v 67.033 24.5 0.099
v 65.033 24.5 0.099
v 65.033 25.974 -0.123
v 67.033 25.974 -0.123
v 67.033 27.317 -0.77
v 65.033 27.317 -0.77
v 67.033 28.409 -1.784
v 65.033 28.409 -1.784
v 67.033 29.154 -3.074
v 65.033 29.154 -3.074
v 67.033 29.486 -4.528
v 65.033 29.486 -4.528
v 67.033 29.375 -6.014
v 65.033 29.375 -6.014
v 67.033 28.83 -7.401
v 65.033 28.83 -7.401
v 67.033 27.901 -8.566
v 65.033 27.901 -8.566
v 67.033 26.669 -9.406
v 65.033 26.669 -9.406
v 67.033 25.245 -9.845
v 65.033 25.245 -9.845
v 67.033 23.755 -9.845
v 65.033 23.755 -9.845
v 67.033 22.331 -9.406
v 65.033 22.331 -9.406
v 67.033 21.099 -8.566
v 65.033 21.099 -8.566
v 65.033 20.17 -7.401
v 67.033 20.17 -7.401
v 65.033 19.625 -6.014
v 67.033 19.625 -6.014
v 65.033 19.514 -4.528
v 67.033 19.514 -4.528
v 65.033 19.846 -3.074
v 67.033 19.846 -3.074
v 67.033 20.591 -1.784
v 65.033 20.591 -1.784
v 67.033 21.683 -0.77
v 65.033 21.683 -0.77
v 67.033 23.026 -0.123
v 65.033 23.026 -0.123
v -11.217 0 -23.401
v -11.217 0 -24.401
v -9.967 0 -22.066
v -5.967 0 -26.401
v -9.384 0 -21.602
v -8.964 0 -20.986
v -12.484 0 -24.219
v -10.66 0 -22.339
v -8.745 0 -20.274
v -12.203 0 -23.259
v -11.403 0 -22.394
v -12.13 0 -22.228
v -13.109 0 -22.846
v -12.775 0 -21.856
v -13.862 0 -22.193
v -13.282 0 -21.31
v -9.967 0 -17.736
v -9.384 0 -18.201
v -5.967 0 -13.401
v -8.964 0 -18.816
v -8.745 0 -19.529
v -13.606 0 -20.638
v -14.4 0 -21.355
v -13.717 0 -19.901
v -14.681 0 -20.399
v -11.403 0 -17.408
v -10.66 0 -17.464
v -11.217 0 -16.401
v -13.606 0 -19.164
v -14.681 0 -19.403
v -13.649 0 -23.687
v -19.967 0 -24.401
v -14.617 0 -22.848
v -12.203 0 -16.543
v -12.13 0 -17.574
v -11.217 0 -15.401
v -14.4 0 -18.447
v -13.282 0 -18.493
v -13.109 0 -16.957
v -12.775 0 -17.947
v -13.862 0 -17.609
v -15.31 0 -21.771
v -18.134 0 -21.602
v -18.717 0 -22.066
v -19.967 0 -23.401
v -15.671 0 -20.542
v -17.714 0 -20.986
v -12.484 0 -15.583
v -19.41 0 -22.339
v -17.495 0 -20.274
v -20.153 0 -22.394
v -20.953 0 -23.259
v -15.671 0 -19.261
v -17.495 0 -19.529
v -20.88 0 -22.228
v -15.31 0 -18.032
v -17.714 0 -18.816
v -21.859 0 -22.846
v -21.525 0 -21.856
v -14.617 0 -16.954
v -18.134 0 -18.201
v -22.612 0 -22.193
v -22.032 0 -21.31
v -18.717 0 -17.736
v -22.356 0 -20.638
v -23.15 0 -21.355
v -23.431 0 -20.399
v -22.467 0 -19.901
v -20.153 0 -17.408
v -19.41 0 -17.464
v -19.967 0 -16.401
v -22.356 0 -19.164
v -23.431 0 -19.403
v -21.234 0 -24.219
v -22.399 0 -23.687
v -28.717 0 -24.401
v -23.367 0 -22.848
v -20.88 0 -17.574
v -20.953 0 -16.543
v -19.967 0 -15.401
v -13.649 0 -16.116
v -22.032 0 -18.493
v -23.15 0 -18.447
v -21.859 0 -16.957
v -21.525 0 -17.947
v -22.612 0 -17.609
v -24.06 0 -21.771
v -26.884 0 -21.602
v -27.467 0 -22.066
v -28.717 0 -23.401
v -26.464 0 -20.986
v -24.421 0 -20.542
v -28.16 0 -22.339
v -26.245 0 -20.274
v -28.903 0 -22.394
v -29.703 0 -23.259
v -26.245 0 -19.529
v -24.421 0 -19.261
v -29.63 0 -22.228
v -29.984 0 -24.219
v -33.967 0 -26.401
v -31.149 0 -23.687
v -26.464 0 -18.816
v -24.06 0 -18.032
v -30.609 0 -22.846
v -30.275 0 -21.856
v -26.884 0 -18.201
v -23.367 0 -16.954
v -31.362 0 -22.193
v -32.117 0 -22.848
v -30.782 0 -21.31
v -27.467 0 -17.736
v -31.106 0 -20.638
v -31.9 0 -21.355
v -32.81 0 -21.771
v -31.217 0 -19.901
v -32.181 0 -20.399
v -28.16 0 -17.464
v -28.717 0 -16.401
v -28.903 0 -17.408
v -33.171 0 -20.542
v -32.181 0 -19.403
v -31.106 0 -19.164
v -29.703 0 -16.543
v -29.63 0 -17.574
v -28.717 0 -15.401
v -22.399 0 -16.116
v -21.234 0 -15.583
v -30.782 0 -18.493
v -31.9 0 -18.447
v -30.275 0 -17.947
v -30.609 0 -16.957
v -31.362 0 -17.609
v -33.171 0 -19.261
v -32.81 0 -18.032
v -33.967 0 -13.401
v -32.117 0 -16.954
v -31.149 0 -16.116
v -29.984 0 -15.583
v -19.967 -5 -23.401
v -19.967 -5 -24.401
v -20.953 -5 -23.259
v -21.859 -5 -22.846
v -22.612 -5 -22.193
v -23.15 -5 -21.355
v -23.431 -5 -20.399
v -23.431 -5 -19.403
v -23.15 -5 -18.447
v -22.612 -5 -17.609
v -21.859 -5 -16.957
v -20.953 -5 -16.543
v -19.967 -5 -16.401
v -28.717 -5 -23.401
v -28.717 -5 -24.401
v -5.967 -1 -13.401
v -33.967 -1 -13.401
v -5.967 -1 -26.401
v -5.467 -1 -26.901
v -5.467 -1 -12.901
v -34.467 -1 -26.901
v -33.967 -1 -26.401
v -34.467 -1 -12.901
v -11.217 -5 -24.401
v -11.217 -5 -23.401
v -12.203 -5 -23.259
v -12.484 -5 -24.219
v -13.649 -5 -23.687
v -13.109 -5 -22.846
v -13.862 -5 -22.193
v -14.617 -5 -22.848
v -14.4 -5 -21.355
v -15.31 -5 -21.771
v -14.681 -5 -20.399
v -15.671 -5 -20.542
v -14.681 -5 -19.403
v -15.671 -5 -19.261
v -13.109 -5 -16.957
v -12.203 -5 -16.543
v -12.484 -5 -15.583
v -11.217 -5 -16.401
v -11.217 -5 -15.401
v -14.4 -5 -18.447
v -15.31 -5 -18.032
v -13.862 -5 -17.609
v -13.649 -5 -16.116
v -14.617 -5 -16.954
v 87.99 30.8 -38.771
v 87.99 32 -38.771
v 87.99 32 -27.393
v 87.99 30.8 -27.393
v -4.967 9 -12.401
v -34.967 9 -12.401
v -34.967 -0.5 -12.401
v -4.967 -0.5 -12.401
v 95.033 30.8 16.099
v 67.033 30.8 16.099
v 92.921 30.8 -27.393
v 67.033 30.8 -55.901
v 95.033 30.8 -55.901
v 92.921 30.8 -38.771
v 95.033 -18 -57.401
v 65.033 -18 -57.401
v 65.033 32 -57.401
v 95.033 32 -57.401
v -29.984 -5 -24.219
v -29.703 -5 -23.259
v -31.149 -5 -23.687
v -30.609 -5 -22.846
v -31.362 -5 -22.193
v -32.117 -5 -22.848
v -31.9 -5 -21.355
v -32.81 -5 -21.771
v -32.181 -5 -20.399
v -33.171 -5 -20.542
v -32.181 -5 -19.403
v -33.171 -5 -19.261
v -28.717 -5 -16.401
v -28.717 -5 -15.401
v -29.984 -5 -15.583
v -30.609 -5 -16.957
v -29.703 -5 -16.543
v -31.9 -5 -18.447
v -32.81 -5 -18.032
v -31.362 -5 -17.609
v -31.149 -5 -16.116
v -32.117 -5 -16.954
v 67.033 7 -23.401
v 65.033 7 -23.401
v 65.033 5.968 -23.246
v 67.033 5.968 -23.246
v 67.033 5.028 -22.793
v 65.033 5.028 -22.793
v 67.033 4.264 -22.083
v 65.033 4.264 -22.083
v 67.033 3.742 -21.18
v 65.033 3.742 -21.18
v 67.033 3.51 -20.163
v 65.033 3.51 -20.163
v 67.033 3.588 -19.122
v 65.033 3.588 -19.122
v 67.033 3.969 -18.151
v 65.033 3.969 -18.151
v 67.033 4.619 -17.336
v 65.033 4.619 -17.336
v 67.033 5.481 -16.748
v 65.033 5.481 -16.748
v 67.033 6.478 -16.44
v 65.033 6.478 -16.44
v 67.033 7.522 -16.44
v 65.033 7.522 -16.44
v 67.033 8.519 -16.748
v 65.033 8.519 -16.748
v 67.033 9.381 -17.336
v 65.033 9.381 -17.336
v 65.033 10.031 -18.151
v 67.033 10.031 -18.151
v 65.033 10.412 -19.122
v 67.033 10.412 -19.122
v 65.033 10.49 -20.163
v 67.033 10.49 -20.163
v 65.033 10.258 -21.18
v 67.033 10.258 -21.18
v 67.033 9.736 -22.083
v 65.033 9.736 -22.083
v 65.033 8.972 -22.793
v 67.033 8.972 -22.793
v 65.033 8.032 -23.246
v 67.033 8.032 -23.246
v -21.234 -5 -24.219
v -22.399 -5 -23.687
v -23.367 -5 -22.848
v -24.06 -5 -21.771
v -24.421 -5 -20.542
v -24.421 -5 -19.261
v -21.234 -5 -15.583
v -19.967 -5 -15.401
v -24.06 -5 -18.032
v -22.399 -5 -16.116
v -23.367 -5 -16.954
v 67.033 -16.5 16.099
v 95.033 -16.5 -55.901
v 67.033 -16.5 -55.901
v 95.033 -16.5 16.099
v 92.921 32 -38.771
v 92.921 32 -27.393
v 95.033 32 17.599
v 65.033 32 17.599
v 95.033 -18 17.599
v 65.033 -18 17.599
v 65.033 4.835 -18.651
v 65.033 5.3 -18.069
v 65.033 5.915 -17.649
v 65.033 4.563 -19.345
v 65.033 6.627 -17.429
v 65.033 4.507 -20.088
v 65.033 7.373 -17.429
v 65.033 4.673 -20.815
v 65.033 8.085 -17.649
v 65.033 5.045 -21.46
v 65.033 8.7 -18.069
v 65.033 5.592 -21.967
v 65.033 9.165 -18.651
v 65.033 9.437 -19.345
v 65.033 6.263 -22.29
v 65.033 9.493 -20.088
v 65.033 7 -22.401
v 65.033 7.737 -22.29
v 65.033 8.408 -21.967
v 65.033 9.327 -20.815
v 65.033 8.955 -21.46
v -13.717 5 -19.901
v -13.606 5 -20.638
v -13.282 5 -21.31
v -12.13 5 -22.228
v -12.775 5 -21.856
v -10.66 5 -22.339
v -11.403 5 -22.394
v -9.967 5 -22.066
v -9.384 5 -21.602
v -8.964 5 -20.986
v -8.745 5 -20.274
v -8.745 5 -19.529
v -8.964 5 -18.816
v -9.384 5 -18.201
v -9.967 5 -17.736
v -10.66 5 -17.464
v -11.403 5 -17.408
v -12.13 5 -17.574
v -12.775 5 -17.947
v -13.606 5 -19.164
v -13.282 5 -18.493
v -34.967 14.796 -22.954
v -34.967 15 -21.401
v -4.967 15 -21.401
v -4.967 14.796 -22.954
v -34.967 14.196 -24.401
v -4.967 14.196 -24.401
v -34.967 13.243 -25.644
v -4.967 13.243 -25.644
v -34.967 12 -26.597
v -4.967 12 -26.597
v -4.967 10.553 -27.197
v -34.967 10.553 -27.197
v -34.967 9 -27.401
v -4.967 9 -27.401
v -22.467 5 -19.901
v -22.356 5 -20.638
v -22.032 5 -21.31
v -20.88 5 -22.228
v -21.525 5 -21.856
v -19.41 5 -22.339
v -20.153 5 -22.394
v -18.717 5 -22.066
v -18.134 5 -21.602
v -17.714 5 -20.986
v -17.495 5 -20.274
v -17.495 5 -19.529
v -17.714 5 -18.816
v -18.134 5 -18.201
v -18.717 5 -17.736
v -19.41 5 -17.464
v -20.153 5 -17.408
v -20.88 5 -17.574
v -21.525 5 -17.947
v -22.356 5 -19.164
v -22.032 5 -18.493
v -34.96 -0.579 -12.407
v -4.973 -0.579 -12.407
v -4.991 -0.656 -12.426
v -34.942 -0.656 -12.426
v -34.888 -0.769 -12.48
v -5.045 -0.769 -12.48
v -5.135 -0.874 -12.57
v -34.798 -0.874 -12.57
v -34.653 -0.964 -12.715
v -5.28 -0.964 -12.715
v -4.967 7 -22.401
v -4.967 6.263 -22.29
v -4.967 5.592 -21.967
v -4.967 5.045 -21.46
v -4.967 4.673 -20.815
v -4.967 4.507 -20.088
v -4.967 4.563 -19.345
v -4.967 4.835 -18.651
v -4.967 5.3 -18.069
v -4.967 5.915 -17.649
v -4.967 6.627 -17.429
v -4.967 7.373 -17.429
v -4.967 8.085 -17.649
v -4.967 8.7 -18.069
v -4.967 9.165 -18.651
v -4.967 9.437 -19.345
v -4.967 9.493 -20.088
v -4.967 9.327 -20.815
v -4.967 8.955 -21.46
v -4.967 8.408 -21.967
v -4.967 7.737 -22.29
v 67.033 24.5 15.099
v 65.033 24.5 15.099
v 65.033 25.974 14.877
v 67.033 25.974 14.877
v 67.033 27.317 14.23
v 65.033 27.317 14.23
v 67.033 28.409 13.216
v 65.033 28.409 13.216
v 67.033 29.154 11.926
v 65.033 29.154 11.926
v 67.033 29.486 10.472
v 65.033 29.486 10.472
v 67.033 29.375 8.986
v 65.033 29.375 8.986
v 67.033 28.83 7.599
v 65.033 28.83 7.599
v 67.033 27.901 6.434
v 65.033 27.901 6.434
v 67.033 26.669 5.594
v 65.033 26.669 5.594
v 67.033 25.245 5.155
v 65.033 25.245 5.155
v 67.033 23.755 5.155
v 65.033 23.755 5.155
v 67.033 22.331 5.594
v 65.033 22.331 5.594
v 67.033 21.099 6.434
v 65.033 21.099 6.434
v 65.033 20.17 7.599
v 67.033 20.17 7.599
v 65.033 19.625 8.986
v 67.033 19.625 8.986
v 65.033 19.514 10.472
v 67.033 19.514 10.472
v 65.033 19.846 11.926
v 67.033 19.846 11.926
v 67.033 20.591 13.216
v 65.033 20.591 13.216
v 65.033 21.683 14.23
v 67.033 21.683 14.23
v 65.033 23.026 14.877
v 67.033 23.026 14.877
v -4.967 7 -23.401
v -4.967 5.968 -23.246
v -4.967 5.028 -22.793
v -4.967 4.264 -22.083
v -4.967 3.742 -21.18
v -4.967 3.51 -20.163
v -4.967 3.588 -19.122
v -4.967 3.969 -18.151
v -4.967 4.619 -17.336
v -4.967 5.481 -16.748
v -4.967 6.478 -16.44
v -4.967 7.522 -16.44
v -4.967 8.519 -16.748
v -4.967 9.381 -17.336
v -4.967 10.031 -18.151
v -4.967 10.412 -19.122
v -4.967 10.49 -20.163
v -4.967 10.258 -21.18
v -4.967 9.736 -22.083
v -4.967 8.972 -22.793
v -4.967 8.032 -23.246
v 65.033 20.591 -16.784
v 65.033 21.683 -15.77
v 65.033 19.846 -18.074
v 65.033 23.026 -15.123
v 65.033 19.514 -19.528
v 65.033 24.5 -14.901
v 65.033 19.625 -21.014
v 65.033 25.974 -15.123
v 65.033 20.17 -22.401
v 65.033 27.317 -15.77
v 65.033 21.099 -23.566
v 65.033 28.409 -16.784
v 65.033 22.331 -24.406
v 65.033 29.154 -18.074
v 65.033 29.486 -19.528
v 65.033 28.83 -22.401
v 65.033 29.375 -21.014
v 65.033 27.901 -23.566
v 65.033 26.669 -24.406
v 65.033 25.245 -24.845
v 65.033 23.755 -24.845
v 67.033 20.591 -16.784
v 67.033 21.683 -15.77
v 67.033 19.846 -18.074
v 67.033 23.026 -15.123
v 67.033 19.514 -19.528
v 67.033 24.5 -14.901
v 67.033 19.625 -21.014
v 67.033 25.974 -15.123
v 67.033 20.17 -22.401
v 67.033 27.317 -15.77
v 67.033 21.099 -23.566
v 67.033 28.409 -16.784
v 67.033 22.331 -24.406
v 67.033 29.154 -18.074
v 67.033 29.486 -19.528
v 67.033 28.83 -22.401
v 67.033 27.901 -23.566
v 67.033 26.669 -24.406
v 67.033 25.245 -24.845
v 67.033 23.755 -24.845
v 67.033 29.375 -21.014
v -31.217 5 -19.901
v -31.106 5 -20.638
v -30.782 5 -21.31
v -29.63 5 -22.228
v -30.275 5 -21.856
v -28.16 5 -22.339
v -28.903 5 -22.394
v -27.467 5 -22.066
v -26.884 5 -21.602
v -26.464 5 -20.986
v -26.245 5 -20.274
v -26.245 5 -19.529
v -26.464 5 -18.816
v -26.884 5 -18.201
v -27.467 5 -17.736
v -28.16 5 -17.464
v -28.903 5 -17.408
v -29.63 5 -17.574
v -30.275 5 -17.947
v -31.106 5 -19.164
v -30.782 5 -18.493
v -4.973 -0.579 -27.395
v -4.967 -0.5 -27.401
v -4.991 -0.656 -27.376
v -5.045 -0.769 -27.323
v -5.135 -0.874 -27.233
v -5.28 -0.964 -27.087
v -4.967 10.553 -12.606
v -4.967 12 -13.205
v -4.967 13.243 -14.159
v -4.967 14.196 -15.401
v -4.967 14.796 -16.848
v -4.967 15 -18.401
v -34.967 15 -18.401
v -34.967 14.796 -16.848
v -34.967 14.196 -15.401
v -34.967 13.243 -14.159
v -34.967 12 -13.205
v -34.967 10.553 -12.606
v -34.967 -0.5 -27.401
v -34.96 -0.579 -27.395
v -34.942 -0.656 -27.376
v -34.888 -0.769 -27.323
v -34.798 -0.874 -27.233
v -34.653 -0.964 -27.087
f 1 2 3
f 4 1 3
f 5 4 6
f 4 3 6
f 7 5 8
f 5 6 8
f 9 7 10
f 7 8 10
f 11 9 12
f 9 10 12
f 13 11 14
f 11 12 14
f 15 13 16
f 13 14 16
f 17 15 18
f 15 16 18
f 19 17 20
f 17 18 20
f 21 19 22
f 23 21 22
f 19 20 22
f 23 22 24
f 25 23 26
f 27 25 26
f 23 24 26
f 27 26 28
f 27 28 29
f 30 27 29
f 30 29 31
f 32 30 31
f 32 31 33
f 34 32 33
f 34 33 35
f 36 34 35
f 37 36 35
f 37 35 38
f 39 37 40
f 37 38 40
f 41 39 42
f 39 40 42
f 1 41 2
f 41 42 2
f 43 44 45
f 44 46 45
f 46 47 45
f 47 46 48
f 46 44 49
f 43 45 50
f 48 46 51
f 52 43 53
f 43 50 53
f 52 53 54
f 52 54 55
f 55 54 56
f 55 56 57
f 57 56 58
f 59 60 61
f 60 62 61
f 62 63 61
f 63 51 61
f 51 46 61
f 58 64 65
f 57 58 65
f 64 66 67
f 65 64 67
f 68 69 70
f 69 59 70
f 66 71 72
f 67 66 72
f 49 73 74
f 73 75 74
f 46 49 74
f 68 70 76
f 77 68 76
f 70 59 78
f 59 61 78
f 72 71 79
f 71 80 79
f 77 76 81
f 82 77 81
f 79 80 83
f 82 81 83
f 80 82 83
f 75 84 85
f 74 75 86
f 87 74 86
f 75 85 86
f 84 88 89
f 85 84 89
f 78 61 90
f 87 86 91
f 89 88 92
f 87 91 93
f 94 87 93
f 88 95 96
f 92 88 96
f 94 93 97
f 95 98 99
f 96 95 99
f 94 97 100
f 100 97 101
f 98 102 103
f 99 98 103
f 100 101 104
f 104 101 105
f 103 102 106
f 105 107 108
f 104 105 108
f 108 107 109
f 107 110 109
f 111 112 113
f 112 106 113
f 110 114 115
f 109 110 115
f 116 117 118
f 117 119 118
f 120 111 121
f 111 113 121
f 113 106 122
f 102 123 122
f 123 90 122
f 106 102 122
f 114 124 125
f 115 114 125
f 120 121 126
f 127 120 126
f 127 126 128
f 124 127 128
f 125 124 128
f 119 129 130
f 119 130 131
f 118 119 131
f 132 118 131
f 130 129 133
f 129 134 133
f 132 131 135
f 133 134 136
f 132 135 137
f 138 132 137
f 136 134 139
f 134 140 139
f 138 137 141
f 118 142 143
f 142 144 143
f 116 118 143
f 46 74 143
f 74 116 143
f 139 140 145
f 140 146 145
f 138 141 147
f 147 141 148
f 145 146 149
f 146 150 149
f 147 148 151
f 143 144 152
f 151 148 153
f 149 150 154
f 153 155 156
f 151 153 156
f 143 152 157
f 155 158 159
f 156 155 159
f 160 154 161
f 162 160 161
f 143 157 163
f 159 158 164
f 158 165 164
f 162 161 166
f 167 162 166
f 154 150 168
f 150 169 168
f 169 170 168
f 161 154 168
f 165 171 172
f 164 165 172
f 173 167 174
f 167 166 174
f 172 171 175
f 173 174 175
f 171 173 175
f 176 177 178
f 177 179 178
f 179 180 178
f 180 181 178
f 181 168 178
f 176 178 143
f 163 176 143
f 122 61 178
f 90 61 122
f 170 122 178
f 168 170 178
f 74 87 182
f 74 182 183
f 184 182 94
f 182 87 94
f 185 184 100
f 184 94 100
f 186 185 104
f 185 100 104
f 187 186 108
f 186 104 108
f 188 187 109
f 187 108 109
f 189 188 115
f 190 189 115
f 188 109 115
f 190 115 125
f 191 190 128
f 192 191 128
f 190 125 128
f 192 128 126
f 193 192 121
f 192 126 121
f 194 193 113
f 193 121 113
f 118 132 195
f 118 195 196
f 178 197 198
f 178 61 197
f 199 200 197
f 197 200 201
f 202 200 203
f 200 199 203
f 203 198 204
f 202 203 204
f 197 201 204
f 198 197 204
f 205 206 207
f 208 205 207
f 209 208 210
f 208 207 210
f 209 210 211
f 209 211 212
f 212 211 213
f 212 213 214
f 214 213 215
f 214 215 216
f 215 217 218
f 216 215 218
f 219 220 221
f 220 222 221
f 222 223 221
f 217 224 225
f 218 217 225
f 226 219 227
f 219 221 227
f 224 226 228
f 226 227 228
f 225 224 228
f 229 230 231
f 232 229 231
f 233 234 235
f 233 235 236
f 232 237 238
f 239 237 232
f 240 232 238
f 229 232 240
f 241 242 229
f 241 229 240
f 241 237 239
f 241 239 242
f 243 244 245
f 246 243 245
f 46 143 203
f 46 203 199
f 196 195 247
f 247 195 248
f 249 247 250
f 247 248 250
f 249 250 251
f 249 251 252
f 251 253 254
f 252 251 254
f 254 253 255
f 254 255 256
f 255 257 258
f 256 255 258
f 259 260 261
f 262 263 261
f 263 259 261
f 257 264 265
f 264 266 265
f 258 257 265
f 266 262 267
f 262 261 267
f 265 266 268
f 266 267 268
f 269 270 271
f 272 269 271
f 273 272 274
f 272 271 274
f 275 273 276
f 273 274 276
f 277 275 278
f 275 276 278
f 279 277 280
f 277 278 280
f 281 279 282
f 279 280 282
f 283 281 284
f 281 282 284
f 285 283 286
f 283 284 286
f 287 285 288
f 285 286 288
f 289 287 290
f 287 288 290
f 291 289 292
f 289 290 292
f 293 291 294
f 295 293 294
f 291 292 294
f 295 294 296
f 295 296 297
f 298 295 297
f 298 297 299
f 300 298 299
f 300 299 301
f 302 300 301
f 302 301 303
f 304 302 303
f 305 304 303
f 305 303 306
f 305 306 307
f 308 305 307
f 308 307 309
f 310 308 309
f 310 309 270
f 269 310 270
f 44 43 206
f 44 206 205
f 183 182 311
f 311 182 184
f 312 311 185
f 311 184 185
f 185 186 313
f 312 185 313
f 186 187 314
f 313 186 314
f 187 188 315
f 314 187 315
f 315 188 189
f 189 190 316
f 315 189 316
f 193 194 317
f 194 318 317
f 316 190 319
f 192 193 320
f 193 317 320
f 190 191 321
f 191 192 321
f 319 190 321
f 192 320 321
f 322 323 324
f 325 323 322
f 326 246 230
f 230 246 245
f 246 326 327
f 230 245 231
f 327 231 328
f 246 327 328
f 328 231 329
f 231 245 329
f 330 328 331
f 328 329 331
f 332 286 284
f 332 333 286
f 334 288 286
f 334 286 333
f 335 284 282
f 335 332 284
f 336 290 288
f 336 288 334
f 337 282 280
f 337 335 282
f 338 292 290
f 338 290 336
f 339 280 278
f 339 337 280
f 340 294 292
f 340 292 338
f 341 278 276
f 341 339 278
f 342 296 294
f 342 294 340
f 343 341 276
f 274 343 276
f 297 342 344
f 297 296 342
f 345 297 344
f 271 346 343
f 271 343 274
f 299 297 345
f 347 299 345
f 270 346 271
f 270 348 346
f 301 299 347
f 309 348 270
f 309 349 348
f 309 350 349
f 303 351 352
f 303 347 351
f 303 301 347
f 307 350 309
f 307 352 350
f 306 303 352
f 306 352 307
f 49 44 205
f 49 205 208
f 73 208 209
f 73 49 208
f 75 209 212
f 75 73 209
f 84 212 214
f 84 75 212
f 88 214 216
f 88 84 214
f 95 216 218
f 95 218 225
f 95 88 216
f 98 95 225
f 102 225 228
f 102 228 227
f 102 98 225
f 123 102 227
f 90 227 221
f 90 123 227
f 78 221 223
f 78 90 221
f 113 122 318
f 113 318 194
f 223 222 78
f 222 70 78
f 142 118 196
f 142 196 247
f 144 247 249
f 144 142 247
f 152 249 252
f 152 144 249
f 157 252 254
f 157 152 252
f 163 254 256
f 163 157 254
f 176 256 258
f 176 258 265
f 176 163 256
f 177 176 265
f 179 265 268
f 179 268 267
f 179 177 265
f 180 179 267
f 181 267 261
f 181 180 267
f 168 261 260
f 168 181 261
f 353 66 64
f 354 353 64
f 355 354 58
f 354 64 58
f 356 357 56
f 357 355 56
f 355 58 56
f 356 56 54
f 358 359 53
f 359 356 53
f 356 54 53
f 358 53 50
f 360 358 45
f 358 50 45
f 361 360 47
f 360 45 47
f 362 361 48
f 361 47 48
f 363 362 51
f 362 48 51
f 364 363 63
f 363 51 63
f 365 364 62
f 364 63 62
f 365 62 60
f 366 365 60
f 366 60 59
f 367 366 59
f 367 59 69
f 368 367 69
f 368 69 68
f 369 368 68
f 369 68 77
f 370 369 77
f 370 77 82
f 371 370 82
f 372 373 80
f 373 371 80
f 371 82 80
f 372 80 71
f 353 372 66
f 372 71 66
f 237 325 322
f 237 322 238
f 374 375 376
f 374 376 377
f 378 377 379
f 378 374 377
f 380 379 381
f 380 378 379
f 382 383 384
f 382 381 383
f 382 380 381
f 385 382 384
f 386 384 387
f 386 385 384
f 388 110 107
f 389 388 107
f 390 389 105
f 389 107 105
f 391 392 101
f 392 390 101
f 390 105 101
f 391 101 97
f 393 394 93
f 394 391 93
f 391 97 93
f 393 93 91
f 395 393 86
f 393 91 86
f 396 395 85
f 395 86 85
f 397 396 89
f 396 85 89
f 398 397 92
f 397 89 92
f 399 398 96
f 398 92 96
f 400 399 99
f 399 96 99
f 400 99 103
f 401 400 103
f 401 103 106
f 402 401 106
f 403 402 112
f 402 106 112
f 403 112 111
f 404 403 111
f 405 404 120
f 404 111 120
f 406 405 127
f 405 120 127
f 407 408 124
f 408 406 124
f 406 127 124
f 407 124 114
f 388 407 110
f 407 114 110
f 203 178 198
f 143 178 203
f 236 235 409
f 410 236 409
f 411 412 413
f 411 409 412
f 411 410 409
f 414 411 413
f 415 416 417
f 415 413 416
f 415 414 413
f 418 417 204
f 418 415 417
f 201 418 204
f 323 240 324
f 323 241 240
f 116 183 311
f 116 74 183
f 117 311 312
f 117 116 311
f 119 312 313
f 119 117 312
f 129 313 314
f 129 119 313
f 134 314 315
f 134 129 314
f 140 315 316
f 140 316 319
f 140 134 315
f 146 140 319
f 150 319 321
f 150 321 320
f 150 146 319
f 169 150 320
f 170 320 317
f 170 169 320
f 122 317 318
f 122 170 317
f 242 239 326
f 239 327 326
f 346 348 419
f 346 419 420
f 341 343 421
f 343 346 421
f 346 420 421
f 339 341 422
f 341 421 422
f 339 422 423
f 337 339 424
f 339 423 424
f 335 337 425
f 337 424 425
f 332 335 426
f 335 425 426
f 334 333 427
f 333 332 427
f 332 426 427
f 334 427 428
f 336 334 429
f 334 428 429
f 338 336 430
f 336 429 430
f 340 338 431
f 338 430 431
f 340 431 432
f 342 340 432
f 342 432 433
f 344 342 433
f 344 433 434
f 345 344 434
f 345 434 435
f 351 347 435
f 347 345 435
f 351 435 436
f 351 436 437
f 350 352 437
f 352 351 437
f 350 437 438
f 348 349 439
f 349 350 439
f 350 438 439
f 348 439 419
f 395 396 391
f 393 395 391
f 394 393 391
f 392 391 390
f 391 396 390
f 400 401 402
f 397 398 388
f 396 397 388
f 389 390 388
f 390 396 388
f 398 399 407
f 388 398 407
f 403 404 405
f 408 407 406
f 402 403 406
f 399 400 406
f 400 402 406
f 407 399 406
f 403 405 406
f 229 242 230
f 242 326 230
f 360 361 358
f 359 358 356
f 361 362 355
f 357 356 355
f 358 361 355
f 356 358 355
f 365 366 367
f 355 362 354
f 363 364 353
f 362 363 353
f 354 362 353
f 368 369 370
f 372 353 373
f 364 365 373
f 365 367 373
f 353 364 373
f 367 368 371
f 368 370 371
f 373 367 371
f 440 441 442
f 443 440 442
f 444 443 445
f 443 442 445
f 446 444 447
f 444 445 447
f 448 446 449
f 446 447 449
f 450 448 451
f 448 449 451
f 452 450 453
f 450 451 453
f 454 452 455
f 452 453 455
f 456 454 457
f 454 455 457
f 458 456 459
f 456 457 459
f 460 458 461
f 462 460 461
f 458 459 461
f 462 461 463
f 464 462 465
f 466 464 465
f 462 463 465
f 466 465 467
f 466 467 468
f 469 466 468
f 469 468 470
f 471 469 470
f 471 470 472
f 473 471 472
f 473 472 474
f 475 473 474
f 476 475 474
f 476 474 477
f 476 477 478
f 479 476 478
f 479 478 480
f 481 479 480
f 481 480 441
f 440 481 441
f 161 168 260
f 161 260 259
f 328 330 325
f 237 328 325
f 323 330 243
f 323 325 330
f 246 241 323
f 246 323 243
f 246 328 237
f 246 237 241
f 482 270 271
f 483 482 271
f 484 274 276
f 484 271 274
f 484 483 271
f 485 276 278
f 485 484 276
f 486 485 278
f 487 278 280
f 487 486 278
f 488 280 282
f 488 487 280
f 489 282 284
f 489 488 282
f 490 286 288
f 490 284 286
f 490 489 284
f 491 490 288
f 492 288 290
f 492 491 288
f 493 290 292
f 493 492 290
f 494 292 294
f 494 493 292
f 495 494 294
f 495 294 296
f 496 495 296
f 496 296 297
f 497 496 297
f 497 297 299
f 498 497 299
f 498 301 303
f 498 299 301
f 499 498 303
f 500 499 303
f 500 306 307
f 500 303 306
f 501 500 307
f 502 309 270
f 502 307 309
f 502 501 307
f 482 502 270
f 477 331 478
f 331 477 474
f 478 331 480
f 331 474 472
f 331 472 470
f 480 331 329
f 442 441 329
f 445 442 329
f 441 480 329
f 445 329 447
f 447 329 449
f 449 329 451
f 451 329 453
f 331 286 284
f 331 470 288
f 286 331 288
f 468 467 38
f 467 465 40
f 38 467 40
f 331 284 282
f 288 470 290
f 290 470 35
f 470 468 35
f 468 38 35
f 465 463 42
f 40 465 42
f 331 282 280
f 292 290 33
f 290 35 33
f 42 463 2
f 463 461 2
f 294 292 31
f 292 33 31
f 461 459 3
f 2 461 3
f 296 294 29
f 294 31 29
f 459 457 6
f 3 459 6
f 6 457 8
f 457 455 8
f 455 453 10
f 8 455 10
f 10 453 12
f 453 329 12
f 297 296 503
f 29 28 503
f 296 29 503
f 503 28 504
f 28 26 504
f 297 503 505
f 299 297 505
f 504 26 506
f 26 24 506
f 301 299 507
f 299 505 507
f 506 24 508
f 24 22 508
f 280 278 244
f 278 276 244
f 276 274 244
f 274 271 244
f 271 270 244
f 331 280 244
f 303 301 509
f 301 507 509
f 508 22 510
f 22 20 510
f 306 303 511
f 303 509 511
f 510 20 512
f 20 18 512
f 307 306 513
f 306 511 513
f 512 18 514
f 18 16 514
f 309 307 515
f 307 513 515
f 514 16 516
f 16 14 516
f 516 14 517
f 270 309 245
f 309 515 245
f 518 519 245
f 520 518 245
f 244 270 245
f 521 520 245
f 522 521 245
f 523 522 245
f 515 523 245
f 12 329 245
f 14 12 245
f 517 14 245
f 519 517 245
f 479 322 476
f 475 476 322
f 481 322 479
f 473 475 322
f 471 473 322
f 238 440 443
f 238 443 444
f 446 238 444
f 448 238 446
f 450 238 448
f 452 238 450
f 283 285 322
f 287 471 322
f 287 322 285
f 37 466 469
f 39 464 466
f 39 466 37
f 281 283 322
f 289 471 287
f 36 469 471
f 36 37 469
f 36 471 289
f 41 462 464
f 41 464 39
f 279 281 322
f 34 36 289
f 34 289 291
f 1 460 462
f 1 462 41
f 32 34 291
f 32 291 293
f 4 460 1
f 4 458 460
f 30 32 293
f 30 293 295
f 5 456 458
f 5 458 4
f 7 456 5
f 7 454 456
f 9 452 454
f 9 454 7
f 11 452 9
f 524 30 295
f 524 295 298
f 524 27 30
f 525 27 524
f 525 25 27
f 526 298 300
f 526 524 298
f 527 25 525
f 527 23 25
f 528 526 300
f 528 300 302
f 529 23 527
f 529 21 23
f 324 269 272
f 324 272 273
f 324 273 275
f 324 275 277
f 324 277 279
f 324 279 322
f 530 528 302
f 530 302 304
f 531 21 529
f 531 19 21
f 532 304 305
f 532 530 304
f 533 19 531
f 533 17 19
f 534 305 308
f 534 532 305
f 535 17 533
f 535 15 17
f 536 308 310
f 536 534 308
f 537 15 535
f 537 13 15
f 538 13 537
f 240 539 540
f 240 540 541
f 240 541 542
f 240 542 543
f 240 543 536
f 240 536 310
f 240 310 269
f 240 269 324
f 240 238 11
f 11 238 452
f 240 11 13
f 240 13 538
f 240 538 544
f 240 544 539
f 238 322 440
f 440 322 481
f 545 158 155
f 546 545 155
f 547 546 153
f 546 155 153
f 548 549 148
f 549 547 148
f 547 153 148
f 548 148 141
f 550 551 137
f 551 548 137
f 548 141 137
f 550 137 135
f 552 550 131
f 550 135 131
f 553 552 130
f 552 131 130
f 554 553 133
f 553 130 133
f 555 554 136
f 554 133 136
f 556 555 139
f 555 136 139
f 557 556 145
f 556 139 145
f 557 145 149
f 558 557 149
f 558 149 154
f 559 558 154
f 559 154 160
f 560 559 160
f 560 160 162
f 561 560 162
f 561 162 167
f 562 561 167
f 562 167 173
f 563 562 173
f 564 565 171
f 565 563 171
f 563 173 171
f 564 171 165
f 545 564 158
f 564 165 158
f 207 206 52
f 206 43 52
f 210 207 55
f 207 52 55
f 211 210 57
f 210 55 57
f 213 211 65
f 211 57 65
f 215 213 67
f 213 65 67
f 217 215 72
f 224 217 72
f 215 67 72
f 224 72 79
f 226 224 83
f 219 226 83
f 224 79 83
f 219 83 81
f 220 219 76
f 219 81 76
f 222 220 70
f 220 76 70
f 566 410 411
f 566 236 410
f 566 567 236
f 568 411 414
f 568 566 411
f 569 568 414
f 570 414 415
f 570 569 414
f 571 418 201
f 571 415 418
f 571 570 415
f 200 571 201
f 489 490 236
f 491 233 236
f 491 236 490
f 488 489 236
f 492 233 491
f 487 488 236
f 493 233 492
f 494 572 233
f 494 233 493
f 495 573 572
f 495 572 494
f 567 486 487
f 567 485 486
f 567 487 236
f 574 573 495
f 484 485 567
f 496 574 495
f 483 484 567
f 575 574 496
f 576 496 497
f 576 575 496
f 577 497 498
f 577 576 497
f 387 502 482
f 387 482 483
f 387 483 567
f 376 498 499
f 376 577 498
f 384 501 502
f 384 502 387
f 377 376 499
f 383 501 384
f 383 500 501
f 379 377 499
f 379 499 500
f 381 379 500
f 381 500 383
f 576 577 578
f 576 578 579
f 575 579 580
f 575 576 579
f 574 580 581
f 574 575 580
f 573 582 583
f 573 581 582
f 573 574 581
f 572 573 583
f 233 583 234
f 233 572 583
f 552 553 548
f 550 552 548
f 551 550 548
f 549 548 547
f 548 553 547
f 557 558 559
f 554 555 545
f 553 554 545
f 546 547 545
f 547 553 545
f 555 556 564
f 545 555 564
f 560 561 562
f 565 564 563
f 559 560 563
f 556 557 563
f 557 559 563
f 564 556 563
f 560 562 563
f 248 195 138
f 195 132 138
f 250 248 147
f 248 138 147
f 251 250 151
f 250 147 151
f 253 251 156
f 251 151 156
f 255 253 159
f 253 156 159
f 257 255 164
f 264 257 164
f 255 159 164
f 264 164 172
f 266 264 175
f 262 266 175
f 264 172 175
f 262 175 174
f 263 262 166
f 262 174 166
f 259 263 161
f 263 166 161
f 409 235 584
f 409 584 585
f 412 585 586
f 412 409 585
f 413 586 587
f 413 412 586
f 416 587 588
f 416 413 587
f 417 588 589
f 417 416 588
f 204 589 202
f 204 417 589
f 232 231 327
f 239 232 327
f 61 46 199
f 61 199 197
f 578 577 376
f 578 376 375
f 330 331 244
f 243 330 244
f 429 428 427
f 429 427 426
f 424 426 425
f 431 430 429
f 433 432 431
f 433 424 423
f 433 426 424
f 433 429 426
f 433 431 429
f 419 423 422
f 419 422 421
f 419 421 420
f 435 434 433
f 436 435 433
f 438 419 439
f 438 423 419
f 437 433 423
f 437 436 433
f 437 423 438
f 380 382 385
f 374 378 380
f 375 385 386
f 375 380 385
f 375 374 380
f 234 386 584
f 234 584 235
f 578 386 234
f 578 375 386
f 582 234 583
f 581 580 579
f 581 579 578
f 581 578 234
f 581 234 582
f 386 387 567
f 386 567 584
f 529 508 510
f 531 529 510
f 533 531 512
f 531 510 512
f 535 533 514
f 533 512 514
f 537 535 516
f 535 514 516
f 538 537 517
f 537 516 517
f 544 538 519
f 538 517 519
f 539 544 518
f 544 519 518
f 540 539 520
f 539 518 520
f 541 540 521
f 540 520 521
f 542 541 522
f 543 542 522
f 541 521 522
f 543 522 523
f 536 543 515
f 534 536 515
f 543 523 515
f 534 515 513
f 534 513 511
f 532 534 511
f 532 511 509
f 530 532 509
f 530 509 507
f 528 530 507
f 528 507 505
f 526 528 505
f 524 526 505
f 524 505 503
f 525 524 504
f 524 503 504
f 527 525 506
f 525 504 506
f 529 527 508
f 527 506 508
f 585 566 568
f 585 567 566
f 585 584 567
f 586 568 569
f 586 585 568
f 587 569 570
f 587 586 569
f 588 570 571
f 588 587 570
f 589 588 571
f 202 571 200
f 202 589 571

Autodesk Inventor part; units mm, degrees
ref_plane "YZ Plane" through (0, 0, 0) normal (1, 0, 0) x (0, 1, 0)
ref_plane "XZ Plane" through (0, 0, 0) normal (0, 1, 0) x (-1, 0, 0)
ref_plane "XY Plane" through (0, 0, 0) normal (0, 0, 1) x (1, 0, 0)
sketch "Skizze1" plane through (0, 0, 0) normal (0, 1, 0) x (-1, 0, 0)
  line L0 (34.9666, -12.4012) -> (4.9666, -12.4012)
  line L1 (4.9666, -12.4012) -> (4.9666, -27.4012)
  line L2 (4.9666, -27.4012) -> (34.9666, -27.4012)
  line L3 (34.9666, -27.4012) -> (34.9666, -12.4012)
  circle A0 centre (28.7166, -19.9012) radius 2.5
  circle A1 centre (19.9666, -19.9012) radius 2.5
  circle A2 centre (11.2166, -19.9012) radius 2.5
  line L4 (34.9666, -19.9012) -> (4.9666, -19.9012) construction
  arc A3 (19.9666, -23.4012) -> (19.9666, -16.4012) centre (19.9666, -19.9012) ccw
  arc A4 (28.7166, -23.4012) -> (28.7166, -16.4012) centre (28.7166, -19.9012) ccw
  arc A5 (11.2166, -23.4012) -> (11.2166, -16.4012) centre (11.2166, -19.9012) ccw
  arc A6 (11.2166, -24.4012) -> (11.2166, -15.4012) centre (11.2166, -19.9012) ccw
  arc A7 (19.9666, -24.4012) -> (19.9666, -15.4012) centre (19.9666, -19.9012) ccw
  arc A8 (28.7166, -24.4012) -> (28.7166, -15.4012) centre (28.7166, -19.9012) ccw
  line L5 (11.2166, -16.4012) -> (11.2166, -15.4012)
  line L6 (11.2166, -23.4012) -> (11.2166, -24.4012)
  line L7 (19.9666, -15.4012) -> (19.9666, -16.4012)
  line L8 (19.9666, -23.4012) -> (19.9666, -24.4012)
  line L9 (28.7166, -15.4012) -> (28.7166, -16.4012)
  line L10 (28.7166, -23.4012) -> (28.7166, -24.4012)
  line L11 (33.9666, -26.4012) -> (5.9666, -26.4012)
  line L12 (5.9666, -26.4012) -> (5.9666, -13.4012)
  line L13 (5.9666, -13.4012) -> (33.9666, -13.4012)
  line L14 (33.9666, -13.4012) -> (33.9666, -26.4012)
  point P0 (0, 0)
  dimension "d0" = 30
  dimension "d1" = 5
  dimension "d2" = 5
  dimension "d3" = 5
  dimension "d4" = 15
  dimension "d6" = 0
  dimension "d7" = 0
  dimension "d8" = 0
  dimension "d11" = 6.25
  dimension "d12" = 6.25
  dimension "d14" = 8.75
  dimension "d15" = 3.5
  dimension "d16" = 3.5
  dimension "d17" = 3.5
  dimension "d18" = 4.5
  dimension "d19" = 4.5
  dimension "d20" = 4.5
  dimension "d26" = 1
  dimension "d27" = 1
  dimension "d28" = 1
  dimension "d29" = 1
extrude "Extrusion1" add sketch "Skizze1" along normal blind 15 contours L3 L2 L1 L0 | A0 | A1 | A2 | A3 L7 A7 L8 | A4 L9 A8 L10 | A5 L5 A6 L6 | L11 L12 L13 L14
extrude "Extrusion2" add sketch "Skizze1" against normal blind 5 contours A3 L7 A7 L8 | A4 L9 A8 L10 | A5 L5 A6 L6
fillet "Rundung1" radius 6 2 edges at (-19.9666, 15, -12.4012) (-19.9666, 15, -27.4012)
extrude "Extrusion3" add sketch "Skizze1" against normal blind 1 contours L3 L2 L1 L0
extrude "Extrusion4" cut sketch "Skizze1" along normal blind 5 contours A0 | A1 | A2
fillet "Rundung3" radius 0.5 4 edges at (-19.9666, -1, -27.4012) (-4.9666, -1, -19.9012) (-19.9666, -1, -12.4012) (-34.9666, -1, -19.9012)
sketch "Skizze2" plane through (-4.9666, 15, -18.4012) normal (1, 0, 0) x (0, 0, -1)
  circle A0 centre (1.5, -8) radius 3.5
  circle A1 centre (1.5, -8) radius 2.5
  line L0 (-6, -6) -> (-6, -15.5) projected
  line L1 (0, 0) -> (3, 0) projected
  line L2 (-5.5, -16) -> (8.5, -16) projected
  point P0 (-18.4012, -15)
  dimension "d37" = 7
  dimension "d38" = 5
  dimension "d39" = 7.5
  dimension "d41" = 8
extrude "Extrusion5" add sketch "Skizze2" along normal blind 70
sketch "Skizze3" plane through (65.0334, 7, -19.9012) normal (1, 0, 0) x (0, 0, -1)
  line L0 (37.5, 25) -> (-37.5, 25)
  line L1 (-37.5, 25) -> (-37.5, -25)
  line L2 (-37.5, -25) -> (37.5, -25)
  line L3 (37.5, -25) -> (37.5, 25)
  circle A0 centre (0, 0) radius 3.5 projected
  line L4 (37.5, 25) -> (-37.5, -25) construction
  line L5 (-37.5, 25) -> (37.5, -25) construction
  point P0 (-19.9012, -7)
  dimension "d44" = 75
  dimension "d45" = 50
extrude "Extrusion6" add sketch "Skizze3" along normal blind 30
sketch "Skizze4" plane through (65.0334, 7, -19.9012) normal (-1, 0, 0) x (0, 0, 1)
  circle A0 centre (30, 17.5) radius 5
  circle A1 centre (15, 17.5) radius 5
  circle A2 centre (0, 17.5) radius 5
  line L0 (-37.5, 25) -> (37.5, 25) projected
  line L1 (-37.5, -25) -> (-37.5, 25) projected
  line L2 (37.5, 25) -> (37.5, -25) projected
  point P0 (19.9012, -7)
  dimension "d48" = 10
  dimension "d49" = 10
  dimension "d50" = 10
  dimension "d61" = 7.5
  dimension "d62" = 7.5
  dimension "d63" = 7.5
  dimension "d65" = 7.5
  dimension "d68" = 15
  dimension "d69" = 15
sketch "Skizze5" plane through (65.0334, 32, 17.5988) normal (0, 1, 0) x (1, 0, 0)
  line L0 (22.9571, 44.9916) -> (27.8876, 44.9916)
  line L1 (27.8876, 44.9916) -> (27.8876, 56.3697)
  line L2 (27.8876, 56.3697) -> (22.9571, 56.3697)
  line L3 (22.9571, 56.3697) -> (22.9571, 44.9916)
  point P0 (-65.0334, 17.5988)
sketch "Skizze6" plane through (95.0334, 7, -19.9012) normal (1, 0, 0) x (0, 0, -1)
  line L0 (36, -23.5) -> (-36, -23.5)
  line L1 (-36, -23.5) -> (-36, 23.8)
  line L2 (-36, 23.8) -> (36, 23.8)
  line L3 (36, 23.8) -> (36, -23.5)
  line L4 (-37.5, -25) -> (37.5, -25) projected
  line L5 (-37.5, 25) -> (-37.5, -25) projected
  line L6 (37.5, 25) -> (-37.5, 25) projected
  line L7 (37.5, -25) -> (37.5, 25) projected
  point P0 (-19.9012, -7)
  dimension "d51" = 1.5
  dimension "d52" = 1.5
  dimension "d53" = 1.2
  dimension "d54" = 1.5
extrude "Extrusion7" cut sketch "Skizze6" against normal blind 28 contours L0 L1 L2 L3
extrude "Extrusion8" cut sketch "Skizze4" against normal blind 28
extrude "Extrusion9" cut sketch "Skizze5" against normal blind 28
properties part number "Ampel"
